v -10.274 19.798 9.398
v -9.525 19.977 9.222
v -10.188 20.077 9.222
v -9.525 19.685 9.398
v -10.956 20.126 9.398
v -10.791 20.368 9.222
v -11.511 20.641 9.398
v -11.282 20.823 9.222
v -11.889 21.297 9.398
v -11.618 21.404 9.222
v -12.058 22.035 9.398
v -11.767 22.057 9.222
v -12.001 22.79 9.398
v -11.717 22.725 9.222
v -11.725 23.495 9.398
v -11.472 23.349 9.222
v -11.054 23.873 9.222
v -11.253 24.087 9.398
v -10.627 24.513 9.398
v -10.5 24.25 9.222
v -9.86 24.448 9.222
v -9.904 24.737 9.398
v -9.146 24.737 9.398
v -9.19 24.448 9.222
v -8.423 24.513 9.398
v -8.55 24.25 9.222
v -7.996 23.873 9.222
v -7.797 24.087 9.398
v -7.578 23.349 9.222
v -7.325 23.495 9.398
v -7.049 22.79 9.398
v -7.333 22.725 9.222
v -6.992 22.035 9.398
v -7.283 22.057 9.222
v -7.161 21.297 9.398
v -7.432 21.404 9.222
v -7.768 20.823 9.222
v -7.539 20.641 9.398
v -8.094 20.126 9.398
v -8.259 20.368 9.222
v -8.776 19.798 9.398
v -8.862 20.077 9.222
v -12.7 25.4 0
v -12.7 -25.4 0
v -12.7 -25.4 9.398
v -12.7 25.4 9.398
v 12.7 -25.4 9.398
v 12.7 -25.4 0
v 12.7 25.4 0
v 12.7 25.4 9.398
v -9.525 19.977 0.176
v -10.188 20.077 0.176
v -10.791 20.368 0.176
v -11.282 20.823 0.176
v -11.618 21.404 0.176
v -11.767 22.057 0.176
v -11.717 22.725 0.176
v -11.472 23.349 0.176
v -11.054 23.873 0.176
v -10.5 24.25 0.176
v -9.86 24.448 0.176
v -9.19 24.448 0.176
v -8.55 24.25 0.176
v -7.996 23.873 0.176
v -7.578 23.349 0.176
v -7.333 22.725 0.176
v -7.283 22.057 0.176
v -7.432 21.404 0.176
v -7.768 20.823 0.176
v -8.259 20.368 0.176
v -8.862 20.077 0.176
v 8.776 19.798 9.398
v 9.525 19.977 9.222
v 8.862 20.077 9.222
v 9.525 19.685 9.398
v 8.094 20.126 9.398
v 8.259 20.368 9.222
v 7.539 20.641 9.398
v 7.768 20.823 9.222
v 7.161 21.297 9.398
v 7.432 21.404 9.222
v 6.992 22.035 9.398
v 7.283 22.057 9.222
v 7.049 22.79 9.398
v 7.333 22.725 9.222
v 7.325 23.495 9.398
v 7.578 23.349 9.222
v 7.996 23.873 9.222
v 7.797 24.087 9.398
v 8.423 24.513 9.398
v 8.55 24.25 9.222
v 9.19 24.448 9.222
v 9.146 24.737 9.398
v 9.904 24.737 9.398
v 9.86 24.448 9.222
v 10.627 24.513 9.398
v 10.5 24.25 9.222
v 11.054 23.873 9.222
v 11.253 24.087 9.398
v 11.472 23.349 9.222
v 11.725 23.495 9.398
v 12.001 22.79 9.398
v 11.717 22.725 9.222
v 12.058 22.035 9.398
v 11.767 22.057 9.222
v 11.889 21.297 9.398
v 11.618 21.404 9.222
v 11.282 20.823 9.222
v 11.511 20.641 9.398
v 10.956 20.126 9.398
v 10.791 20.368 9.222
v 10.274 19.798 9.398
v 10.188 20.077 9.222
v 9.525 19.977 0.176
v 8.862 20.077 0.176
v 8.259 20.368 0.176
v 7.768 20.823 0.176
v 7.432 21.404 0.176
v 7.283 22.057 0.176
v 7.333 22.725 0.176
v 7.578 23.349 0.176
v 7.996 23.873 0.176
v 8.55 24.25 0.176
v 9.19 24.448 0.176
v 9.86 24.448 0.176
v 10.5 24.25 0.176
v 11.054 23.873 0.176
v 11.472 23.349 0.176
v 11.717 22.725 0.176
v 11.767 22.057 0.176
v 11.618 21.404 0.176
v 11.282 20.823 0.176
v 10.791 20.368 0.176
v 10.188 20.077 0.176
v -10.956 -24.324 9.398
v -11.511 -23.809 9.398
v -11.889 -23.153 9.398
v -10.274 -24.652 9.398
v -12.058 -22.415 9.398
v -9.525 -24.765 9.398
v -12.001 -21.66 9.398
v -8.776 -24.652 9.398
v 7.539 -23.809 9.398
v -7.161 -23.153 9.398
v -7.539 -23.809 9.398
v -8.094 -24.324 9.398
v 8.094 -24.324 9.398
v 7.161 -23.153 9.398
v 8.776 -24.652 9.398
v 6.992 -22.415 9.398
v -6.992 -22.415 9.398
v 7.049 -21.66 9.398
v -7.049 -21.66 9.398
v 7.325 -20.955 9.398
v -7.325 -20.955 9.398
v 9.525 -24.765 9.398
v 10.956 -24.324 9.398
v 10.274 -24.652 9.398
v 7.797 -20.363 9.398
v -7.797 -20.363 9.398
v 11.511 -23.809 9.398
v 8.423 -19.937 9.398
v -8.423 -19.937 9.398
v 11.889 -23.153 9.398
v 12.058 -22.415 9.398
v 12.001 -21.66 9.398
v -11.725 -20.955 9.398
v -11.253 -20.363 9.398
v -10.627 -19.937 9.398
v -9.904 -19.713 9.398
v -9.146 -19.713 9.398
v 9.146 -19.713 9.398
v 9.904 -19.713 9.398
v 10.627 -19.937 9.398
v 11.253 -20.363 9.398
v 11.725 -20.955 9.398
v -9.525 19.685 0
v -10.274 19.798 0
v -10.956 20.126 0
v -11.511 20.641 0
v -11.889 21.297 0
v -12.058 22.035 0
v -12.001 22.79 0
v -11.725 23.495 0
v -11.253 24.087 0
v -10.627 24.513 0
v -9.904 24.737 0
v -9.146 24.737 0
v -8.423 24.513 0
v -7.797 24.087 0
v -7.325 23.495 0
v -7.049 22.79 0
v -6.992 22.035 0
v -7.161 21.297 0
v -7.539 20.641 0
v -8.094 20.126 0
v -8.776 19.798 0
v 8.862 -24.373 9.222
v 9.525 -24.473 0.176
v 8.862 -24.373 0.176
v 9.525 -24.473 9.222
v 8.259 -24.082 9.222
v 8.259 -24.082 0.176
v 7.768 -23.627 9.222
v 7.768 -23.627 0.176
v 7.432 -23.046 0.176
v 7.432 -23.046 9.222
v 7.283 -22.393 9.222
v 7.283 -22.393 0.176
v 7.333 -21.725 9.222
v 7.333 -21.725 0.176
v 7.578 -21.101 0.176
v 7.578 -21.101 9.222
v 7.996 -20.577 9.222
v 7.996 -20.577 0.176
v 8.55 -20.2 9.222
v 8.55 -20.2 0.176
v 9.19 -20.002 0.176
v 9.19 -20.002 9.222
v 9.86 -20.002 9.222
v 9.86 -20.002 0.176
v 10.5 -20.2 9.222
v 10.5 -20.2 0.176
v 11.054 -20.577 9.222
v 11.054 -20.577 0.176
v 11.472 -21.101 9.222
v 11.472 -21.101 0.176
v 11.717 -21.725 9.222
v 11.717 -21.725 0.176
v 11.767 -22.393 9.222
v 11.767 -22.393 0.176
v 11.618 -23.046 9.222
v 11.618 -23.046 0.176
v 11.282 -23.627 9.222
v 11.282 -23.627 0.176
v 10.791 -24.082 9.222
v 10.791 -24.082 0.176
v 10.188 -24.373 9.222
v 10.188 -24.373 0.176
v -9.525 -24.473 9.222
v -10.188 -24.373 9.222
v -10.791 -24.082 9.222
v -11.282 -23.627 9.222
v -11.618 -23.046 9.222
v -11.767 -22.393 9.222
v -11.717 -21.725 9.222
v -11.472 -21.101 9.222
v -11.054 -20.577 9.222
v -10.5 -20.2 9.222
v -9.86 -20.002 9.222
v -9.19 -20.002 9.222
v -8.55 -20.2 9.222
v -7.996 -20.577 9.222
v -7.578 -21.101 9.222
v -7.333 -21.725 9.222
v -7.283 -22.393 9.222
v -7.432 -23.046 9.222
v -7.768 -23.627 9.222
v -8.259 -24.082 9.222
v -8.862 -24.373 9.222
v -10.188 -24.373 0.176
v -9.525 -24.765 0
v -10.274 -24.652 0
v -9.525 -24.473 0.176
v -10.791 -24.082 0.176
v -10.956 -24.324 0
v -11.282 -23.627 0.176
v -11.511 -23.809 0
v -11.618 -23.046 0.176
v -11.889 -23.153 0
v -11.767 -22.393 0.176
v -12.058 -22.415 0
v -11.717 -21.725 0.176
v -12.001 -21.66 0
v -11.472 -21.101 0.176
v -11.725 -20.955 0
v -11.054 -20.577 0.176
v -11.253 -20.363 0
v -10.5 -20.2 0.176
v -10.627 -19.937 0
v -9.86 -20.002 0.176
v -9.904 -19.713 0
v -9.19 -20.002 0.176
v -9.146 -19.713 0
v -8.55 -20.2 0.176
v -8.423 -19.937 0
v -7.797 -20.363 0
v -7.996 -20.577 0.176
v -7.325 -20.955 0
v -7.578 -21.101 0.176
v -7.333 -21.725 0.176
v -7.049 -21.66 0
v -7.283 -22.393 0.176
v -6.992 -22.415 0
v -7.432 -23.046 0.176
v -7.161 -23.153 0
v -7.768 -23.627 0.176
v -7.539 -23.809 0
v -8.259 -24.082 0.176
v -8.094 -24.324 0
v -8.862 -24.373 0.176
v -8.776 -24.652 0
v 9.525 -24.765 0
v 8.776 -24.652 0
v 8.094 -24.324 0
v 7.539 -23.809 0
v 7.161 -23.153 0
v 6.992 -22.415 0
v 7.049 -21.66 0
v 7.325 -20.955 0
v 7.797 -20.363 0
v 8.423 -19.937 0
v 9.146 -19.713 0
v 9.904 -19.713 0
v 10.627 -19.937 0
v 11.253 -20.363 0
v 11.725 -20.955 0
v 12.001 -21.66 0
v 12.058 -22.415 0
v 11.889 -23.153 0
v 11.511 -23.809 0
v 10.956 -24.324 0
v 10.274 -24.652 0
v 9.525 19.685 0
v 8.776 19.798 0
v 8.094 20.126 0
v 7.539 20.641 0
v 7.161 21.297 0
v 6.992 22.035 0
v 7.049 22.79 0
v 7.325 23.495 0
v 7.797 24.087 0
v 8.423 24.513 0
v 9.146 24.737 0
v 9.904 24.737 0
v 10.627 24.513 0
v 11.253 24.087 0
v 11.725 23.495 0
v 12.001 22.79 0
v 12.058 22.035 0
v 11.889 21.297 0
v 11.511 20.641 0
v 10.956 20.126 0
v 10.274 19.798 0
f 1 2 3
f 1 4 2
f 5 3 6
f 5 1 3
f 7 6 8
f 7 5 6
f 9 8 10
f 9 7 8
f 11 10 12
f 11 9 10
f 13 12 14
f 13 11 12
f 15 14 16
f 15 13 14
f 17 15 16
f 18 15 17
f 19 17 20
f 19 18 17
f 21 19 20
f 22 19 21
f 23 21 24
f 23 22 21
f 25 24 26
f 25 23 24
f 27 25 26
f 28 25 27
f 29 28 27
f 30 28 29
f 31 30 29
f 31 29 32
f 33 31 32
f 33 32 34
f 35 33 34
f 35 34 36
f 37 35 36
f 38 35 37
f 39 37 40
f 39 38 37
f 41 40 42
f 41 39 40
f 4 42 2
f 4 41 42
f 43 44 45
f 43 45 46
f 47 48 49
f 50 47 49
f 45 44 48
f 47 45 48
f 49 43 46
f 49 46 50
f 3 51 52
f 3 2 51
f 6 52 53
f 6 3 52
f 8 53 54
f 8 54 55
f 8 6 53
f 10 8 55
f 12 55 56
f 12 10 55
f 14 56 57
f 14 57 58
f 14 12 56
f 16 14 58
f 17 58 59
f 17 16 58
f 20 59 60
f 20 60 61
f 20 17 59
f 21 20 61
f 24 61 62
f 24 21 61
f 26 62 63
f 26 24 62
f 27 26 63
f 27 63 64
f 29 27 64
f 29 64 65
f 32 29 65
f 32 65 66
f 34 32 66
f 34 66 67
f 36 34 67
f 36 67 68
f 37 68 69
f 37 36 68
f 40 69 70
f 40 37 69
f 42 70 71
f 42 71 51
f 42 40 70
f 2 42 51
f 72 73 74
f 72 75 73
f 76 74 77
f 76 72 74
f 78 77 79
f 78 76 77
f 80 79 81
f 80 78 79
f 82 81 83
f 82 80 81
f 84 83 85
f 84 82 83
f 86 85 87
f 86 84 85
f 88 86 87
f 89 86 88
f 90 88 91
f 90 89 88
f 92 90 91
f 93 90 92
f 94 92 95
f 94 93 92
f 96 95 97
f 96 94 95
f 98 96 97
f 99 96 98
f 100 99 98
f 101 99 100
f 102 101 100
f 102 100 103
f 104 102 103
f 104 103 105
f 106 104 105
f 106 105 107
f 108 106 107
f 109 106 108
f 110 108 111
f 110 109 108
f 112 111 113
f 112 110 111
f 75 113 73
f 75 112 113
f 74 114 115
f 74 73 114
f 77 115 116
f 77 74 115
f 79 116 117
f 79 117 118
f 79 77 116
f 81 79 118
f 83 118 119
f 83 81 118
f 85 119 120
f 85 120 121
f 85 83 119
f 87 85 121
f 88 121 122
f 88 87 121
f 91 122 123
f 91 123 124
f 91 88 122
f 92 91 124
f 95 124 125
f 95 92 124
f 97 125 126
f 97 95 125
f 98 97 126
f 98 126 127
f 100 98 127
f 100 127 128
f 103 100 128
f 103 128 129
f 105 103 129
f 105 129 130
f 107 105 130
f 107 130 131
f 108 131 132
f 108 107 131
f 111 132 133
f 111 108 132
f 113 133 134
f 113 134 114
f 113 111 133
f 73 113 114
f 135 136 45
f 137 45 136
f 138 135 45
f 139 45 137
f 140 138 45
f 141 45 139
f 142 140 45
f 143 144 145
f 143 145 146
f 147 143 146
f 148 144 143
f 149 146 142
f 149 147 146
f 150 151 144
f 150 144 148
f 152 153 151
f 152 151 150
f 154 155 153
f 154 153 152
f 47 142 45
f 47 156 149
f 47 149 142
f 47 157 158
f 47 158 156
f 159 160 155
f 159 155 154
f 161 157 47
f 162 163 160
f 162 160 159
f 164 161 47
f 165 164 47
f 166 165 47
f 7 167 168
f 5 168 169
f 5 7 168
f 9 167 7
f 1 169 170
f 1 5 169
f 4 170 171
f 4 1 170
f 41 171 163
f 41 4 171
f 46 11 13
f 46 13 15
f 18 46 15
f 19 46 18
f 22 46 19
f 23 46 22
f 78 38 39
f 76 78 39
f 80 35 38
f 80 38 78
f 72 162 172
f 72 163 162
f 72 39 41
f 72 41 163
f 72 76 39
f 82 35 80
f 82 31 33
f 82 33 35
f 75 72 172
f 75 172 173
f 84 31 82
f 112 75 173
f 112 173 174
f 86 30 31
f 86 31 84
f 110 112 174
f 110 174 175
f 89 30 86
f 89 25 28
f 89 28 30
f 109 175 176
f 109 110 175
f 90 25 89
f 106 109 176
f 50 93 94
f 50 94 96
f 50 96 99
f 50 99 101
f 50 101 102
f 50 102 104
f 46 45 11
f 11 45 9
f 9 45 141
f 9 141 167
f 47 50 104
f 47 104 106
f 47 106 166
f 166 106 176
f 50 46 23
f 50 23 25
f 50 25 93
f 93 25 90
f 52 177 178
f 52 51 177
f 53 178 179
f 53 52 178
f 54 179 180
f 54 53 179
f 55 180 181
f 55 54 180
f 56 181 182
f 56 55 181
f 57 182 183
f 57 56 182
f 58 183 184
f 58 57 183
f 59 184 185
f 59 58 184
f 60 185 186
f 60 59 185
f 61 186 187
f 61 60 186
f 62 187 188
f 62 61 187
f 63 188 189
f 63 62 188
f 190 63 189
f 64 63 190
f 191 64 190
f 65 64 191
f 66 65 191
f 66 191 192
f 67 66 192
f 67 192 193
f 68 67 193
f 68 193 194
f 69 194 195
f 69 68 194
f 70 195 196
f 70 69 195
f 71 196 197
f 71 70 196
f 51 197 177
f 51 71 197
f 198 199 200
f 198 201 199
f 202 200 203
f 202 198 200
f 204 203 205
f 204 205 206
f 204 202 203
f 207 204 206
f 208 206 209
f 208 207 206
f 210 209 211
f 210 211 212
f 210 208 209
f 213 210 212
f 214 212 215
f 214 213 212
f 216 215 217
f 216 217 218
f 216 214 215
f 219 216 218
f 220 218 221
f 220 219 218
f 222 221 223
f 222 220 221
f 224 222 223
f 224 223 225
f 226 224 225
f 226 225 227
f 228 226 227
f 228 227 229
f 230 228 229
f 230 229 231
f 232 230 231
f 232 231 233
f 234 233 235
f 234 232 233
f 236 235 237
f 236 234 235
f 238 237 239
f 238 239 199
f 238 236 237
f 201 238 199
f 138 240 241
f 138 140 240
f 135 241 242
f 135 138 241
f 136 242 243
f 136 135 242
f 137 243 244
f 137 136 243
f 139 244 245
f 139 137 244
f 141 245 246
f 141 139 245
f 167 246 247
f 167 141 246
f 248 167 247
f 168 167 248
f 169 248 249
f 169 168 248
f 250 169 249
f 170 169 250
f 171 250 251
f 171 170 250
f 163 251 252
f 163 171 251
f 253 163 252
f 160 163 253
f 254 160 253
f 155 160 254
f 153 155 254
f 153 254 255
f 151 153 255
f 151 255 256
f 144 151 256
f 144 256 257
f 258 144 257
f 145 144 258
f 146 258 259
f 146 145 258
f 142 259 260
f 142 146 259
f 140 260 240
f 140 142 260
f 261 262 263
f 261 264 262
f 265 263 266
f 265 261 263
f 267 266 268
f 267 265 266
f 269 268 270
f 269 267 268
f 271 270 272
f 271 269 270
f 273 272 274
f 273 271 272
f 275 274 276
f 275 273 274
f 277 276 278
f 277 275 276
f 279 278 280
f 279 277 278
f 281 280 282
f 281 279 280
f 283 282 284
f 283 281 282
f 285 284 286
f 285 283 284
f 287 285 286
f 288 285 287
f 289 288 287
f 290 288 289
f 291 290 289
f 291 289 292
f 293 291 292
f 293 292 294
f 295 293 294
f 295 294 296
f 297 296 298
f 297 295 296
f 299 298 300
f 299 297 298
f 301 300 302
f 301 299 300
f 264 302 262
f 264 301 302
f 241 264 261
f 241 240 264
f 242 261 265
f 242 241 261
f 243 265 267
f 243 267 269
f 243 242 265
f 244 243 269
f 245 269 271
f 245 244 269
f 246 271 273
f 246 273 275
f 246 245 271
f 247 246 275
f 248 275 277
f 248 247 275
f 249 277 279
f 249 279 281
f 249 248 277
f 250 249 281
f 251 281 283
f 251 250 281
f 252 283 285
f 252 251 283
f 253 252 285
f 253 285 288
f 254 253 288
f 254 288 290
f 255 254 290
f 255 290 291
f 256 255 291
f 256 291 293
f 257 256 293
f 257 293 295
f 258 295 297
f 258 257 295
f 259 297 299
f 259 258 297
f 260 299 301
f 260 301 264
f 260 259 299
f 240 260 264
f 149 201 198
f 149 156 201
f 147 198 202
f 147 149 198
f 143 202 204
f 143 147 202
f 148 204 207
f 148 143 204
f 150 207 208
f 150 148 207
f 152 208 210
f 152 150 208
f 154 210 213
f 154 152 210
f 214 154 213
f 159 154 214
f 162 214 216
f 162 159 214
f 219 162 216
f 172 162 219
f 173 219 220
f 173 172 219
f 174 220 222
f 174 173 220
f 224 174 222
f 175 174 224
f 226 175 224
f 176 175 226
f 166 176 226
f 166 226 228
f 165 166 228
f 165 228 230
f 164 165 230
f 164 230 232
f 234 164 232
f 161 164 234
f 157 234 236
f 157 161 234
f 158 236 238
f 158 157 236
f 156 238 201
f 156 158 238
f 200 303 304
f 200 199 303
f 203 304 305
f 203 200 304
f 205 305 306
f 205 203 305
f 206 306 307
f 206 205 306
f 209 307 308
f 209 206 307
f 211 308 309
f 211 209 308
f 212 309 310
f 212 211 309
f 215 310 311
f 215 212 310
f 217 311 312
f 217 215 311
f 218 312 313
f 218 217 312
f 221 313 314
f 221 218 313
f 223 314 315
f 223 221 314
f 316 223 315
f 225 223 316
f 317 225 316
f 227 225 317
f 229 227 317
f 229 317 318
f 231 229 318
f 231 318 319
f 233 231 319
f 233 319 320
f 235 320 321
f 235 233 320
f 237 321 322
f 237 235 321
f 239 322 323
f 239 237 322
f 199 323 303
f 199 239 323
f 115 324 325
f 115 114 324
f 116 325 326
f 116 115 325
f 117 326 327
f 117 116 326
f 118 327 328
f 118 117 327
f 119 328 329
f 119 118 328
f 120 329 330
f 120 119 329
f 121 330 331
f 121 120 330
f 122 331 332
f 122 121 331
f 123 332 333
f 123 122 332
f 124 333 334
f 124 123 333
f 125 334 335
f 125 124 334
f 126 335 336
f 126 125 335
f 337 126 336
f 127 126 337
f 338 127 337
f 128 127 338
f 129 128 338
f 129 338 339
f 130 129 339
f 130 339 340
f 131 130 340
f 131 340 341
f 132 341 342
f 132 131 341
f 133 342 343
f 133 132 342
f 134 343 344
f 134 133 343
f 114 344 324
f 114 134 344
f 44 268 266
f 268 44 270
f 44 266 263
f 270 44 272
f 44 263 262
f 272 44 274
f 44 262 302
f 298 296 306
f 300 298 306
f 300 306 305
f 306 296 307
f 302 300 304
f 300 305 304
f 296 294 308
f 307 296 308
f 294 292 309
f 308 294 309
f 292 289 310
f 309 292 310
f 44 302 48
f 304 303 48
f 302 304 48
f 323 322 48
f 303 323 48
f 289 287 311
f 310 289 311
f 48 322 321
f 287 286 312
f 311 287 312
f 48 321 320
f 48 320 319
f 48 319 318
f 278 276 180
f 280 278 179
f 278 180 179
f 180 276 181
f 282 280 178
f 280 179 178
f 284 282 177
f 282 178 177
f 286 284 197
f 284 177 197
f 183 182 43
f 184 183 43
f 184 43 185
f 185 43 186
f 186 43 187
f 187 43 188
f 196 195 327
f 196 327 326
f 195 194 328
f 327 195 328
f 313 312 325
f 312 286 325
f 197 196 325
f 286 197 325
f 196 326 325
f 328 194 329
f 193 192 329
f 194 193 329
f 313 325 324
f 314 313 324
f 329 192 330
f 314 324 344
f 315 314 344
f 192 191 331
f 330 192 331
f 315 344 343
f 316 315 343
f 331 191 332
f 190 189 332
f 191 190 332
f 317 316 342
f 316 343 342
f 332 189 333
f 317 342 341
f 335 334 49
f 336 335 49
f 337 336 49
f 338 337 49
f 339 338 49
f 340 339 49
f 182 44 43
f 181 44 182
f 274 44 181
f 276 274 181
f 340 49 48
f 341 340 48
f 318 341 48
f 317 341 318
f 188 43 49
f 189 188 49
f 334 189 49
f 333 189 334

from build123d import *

# Parameters (mm, degrees)
SKETCH1_W            = 25.4
SKETCH1_H            = 50.8
BOSS_EXTRUDE1_DEPTH  = 9.398
LPATTERN1_COUNT      = 2
LPATTERN1_PITCH      = 44.45
LPATTERN1_COUNT_DIR2 = 2
LPATTERN1_PITCH_DIR2 = 19.05


with BuildPart() as part:
    # Sketch1 → Boss-Extrude1 (new body)
    with BuildSketch(Plane.XY):
        Rectangle(SKETCH1_W, SKETCH1_H)
    extrude(amount=BOSS_EXTRUDE1_DEPTH)

    # Sketch3 → #8 Clearance Hole1 (revolve, cut)
    with BuildSketch(Plane(origin=(-9.525, -22.225, 9.398), x_dir=(0, -1, 0), z_dir=(1, 0, 0))):
        Polygon((0, 0), (0, 9.398), (2.54, 9.398), (2.2479, 9.222488613), (2.2479, 0.175511387), (2.54, 0), align=None)
    f_8_clearance_hole1 = revolve(axis=Axis((-9.525, -22.225, 15.748), (0, 0, -1)), mode=Mode.SUBTRACT)

    # LPattern1: 8 Clearance Hole1 2 × 2
    with Locations(*[(j * LPATTERN1_PITCH_DIR2, i * LPATTERN1_PITCH, 0) for i in range(LPATTERN1_COUNT) for j in range(LPATTERN1_COUNT_DIR2) if (i, j) != (0, 0)]):
        add(f_8_clearance_hole1, mode=Mode.SUBTRACT)


solid = part.part
